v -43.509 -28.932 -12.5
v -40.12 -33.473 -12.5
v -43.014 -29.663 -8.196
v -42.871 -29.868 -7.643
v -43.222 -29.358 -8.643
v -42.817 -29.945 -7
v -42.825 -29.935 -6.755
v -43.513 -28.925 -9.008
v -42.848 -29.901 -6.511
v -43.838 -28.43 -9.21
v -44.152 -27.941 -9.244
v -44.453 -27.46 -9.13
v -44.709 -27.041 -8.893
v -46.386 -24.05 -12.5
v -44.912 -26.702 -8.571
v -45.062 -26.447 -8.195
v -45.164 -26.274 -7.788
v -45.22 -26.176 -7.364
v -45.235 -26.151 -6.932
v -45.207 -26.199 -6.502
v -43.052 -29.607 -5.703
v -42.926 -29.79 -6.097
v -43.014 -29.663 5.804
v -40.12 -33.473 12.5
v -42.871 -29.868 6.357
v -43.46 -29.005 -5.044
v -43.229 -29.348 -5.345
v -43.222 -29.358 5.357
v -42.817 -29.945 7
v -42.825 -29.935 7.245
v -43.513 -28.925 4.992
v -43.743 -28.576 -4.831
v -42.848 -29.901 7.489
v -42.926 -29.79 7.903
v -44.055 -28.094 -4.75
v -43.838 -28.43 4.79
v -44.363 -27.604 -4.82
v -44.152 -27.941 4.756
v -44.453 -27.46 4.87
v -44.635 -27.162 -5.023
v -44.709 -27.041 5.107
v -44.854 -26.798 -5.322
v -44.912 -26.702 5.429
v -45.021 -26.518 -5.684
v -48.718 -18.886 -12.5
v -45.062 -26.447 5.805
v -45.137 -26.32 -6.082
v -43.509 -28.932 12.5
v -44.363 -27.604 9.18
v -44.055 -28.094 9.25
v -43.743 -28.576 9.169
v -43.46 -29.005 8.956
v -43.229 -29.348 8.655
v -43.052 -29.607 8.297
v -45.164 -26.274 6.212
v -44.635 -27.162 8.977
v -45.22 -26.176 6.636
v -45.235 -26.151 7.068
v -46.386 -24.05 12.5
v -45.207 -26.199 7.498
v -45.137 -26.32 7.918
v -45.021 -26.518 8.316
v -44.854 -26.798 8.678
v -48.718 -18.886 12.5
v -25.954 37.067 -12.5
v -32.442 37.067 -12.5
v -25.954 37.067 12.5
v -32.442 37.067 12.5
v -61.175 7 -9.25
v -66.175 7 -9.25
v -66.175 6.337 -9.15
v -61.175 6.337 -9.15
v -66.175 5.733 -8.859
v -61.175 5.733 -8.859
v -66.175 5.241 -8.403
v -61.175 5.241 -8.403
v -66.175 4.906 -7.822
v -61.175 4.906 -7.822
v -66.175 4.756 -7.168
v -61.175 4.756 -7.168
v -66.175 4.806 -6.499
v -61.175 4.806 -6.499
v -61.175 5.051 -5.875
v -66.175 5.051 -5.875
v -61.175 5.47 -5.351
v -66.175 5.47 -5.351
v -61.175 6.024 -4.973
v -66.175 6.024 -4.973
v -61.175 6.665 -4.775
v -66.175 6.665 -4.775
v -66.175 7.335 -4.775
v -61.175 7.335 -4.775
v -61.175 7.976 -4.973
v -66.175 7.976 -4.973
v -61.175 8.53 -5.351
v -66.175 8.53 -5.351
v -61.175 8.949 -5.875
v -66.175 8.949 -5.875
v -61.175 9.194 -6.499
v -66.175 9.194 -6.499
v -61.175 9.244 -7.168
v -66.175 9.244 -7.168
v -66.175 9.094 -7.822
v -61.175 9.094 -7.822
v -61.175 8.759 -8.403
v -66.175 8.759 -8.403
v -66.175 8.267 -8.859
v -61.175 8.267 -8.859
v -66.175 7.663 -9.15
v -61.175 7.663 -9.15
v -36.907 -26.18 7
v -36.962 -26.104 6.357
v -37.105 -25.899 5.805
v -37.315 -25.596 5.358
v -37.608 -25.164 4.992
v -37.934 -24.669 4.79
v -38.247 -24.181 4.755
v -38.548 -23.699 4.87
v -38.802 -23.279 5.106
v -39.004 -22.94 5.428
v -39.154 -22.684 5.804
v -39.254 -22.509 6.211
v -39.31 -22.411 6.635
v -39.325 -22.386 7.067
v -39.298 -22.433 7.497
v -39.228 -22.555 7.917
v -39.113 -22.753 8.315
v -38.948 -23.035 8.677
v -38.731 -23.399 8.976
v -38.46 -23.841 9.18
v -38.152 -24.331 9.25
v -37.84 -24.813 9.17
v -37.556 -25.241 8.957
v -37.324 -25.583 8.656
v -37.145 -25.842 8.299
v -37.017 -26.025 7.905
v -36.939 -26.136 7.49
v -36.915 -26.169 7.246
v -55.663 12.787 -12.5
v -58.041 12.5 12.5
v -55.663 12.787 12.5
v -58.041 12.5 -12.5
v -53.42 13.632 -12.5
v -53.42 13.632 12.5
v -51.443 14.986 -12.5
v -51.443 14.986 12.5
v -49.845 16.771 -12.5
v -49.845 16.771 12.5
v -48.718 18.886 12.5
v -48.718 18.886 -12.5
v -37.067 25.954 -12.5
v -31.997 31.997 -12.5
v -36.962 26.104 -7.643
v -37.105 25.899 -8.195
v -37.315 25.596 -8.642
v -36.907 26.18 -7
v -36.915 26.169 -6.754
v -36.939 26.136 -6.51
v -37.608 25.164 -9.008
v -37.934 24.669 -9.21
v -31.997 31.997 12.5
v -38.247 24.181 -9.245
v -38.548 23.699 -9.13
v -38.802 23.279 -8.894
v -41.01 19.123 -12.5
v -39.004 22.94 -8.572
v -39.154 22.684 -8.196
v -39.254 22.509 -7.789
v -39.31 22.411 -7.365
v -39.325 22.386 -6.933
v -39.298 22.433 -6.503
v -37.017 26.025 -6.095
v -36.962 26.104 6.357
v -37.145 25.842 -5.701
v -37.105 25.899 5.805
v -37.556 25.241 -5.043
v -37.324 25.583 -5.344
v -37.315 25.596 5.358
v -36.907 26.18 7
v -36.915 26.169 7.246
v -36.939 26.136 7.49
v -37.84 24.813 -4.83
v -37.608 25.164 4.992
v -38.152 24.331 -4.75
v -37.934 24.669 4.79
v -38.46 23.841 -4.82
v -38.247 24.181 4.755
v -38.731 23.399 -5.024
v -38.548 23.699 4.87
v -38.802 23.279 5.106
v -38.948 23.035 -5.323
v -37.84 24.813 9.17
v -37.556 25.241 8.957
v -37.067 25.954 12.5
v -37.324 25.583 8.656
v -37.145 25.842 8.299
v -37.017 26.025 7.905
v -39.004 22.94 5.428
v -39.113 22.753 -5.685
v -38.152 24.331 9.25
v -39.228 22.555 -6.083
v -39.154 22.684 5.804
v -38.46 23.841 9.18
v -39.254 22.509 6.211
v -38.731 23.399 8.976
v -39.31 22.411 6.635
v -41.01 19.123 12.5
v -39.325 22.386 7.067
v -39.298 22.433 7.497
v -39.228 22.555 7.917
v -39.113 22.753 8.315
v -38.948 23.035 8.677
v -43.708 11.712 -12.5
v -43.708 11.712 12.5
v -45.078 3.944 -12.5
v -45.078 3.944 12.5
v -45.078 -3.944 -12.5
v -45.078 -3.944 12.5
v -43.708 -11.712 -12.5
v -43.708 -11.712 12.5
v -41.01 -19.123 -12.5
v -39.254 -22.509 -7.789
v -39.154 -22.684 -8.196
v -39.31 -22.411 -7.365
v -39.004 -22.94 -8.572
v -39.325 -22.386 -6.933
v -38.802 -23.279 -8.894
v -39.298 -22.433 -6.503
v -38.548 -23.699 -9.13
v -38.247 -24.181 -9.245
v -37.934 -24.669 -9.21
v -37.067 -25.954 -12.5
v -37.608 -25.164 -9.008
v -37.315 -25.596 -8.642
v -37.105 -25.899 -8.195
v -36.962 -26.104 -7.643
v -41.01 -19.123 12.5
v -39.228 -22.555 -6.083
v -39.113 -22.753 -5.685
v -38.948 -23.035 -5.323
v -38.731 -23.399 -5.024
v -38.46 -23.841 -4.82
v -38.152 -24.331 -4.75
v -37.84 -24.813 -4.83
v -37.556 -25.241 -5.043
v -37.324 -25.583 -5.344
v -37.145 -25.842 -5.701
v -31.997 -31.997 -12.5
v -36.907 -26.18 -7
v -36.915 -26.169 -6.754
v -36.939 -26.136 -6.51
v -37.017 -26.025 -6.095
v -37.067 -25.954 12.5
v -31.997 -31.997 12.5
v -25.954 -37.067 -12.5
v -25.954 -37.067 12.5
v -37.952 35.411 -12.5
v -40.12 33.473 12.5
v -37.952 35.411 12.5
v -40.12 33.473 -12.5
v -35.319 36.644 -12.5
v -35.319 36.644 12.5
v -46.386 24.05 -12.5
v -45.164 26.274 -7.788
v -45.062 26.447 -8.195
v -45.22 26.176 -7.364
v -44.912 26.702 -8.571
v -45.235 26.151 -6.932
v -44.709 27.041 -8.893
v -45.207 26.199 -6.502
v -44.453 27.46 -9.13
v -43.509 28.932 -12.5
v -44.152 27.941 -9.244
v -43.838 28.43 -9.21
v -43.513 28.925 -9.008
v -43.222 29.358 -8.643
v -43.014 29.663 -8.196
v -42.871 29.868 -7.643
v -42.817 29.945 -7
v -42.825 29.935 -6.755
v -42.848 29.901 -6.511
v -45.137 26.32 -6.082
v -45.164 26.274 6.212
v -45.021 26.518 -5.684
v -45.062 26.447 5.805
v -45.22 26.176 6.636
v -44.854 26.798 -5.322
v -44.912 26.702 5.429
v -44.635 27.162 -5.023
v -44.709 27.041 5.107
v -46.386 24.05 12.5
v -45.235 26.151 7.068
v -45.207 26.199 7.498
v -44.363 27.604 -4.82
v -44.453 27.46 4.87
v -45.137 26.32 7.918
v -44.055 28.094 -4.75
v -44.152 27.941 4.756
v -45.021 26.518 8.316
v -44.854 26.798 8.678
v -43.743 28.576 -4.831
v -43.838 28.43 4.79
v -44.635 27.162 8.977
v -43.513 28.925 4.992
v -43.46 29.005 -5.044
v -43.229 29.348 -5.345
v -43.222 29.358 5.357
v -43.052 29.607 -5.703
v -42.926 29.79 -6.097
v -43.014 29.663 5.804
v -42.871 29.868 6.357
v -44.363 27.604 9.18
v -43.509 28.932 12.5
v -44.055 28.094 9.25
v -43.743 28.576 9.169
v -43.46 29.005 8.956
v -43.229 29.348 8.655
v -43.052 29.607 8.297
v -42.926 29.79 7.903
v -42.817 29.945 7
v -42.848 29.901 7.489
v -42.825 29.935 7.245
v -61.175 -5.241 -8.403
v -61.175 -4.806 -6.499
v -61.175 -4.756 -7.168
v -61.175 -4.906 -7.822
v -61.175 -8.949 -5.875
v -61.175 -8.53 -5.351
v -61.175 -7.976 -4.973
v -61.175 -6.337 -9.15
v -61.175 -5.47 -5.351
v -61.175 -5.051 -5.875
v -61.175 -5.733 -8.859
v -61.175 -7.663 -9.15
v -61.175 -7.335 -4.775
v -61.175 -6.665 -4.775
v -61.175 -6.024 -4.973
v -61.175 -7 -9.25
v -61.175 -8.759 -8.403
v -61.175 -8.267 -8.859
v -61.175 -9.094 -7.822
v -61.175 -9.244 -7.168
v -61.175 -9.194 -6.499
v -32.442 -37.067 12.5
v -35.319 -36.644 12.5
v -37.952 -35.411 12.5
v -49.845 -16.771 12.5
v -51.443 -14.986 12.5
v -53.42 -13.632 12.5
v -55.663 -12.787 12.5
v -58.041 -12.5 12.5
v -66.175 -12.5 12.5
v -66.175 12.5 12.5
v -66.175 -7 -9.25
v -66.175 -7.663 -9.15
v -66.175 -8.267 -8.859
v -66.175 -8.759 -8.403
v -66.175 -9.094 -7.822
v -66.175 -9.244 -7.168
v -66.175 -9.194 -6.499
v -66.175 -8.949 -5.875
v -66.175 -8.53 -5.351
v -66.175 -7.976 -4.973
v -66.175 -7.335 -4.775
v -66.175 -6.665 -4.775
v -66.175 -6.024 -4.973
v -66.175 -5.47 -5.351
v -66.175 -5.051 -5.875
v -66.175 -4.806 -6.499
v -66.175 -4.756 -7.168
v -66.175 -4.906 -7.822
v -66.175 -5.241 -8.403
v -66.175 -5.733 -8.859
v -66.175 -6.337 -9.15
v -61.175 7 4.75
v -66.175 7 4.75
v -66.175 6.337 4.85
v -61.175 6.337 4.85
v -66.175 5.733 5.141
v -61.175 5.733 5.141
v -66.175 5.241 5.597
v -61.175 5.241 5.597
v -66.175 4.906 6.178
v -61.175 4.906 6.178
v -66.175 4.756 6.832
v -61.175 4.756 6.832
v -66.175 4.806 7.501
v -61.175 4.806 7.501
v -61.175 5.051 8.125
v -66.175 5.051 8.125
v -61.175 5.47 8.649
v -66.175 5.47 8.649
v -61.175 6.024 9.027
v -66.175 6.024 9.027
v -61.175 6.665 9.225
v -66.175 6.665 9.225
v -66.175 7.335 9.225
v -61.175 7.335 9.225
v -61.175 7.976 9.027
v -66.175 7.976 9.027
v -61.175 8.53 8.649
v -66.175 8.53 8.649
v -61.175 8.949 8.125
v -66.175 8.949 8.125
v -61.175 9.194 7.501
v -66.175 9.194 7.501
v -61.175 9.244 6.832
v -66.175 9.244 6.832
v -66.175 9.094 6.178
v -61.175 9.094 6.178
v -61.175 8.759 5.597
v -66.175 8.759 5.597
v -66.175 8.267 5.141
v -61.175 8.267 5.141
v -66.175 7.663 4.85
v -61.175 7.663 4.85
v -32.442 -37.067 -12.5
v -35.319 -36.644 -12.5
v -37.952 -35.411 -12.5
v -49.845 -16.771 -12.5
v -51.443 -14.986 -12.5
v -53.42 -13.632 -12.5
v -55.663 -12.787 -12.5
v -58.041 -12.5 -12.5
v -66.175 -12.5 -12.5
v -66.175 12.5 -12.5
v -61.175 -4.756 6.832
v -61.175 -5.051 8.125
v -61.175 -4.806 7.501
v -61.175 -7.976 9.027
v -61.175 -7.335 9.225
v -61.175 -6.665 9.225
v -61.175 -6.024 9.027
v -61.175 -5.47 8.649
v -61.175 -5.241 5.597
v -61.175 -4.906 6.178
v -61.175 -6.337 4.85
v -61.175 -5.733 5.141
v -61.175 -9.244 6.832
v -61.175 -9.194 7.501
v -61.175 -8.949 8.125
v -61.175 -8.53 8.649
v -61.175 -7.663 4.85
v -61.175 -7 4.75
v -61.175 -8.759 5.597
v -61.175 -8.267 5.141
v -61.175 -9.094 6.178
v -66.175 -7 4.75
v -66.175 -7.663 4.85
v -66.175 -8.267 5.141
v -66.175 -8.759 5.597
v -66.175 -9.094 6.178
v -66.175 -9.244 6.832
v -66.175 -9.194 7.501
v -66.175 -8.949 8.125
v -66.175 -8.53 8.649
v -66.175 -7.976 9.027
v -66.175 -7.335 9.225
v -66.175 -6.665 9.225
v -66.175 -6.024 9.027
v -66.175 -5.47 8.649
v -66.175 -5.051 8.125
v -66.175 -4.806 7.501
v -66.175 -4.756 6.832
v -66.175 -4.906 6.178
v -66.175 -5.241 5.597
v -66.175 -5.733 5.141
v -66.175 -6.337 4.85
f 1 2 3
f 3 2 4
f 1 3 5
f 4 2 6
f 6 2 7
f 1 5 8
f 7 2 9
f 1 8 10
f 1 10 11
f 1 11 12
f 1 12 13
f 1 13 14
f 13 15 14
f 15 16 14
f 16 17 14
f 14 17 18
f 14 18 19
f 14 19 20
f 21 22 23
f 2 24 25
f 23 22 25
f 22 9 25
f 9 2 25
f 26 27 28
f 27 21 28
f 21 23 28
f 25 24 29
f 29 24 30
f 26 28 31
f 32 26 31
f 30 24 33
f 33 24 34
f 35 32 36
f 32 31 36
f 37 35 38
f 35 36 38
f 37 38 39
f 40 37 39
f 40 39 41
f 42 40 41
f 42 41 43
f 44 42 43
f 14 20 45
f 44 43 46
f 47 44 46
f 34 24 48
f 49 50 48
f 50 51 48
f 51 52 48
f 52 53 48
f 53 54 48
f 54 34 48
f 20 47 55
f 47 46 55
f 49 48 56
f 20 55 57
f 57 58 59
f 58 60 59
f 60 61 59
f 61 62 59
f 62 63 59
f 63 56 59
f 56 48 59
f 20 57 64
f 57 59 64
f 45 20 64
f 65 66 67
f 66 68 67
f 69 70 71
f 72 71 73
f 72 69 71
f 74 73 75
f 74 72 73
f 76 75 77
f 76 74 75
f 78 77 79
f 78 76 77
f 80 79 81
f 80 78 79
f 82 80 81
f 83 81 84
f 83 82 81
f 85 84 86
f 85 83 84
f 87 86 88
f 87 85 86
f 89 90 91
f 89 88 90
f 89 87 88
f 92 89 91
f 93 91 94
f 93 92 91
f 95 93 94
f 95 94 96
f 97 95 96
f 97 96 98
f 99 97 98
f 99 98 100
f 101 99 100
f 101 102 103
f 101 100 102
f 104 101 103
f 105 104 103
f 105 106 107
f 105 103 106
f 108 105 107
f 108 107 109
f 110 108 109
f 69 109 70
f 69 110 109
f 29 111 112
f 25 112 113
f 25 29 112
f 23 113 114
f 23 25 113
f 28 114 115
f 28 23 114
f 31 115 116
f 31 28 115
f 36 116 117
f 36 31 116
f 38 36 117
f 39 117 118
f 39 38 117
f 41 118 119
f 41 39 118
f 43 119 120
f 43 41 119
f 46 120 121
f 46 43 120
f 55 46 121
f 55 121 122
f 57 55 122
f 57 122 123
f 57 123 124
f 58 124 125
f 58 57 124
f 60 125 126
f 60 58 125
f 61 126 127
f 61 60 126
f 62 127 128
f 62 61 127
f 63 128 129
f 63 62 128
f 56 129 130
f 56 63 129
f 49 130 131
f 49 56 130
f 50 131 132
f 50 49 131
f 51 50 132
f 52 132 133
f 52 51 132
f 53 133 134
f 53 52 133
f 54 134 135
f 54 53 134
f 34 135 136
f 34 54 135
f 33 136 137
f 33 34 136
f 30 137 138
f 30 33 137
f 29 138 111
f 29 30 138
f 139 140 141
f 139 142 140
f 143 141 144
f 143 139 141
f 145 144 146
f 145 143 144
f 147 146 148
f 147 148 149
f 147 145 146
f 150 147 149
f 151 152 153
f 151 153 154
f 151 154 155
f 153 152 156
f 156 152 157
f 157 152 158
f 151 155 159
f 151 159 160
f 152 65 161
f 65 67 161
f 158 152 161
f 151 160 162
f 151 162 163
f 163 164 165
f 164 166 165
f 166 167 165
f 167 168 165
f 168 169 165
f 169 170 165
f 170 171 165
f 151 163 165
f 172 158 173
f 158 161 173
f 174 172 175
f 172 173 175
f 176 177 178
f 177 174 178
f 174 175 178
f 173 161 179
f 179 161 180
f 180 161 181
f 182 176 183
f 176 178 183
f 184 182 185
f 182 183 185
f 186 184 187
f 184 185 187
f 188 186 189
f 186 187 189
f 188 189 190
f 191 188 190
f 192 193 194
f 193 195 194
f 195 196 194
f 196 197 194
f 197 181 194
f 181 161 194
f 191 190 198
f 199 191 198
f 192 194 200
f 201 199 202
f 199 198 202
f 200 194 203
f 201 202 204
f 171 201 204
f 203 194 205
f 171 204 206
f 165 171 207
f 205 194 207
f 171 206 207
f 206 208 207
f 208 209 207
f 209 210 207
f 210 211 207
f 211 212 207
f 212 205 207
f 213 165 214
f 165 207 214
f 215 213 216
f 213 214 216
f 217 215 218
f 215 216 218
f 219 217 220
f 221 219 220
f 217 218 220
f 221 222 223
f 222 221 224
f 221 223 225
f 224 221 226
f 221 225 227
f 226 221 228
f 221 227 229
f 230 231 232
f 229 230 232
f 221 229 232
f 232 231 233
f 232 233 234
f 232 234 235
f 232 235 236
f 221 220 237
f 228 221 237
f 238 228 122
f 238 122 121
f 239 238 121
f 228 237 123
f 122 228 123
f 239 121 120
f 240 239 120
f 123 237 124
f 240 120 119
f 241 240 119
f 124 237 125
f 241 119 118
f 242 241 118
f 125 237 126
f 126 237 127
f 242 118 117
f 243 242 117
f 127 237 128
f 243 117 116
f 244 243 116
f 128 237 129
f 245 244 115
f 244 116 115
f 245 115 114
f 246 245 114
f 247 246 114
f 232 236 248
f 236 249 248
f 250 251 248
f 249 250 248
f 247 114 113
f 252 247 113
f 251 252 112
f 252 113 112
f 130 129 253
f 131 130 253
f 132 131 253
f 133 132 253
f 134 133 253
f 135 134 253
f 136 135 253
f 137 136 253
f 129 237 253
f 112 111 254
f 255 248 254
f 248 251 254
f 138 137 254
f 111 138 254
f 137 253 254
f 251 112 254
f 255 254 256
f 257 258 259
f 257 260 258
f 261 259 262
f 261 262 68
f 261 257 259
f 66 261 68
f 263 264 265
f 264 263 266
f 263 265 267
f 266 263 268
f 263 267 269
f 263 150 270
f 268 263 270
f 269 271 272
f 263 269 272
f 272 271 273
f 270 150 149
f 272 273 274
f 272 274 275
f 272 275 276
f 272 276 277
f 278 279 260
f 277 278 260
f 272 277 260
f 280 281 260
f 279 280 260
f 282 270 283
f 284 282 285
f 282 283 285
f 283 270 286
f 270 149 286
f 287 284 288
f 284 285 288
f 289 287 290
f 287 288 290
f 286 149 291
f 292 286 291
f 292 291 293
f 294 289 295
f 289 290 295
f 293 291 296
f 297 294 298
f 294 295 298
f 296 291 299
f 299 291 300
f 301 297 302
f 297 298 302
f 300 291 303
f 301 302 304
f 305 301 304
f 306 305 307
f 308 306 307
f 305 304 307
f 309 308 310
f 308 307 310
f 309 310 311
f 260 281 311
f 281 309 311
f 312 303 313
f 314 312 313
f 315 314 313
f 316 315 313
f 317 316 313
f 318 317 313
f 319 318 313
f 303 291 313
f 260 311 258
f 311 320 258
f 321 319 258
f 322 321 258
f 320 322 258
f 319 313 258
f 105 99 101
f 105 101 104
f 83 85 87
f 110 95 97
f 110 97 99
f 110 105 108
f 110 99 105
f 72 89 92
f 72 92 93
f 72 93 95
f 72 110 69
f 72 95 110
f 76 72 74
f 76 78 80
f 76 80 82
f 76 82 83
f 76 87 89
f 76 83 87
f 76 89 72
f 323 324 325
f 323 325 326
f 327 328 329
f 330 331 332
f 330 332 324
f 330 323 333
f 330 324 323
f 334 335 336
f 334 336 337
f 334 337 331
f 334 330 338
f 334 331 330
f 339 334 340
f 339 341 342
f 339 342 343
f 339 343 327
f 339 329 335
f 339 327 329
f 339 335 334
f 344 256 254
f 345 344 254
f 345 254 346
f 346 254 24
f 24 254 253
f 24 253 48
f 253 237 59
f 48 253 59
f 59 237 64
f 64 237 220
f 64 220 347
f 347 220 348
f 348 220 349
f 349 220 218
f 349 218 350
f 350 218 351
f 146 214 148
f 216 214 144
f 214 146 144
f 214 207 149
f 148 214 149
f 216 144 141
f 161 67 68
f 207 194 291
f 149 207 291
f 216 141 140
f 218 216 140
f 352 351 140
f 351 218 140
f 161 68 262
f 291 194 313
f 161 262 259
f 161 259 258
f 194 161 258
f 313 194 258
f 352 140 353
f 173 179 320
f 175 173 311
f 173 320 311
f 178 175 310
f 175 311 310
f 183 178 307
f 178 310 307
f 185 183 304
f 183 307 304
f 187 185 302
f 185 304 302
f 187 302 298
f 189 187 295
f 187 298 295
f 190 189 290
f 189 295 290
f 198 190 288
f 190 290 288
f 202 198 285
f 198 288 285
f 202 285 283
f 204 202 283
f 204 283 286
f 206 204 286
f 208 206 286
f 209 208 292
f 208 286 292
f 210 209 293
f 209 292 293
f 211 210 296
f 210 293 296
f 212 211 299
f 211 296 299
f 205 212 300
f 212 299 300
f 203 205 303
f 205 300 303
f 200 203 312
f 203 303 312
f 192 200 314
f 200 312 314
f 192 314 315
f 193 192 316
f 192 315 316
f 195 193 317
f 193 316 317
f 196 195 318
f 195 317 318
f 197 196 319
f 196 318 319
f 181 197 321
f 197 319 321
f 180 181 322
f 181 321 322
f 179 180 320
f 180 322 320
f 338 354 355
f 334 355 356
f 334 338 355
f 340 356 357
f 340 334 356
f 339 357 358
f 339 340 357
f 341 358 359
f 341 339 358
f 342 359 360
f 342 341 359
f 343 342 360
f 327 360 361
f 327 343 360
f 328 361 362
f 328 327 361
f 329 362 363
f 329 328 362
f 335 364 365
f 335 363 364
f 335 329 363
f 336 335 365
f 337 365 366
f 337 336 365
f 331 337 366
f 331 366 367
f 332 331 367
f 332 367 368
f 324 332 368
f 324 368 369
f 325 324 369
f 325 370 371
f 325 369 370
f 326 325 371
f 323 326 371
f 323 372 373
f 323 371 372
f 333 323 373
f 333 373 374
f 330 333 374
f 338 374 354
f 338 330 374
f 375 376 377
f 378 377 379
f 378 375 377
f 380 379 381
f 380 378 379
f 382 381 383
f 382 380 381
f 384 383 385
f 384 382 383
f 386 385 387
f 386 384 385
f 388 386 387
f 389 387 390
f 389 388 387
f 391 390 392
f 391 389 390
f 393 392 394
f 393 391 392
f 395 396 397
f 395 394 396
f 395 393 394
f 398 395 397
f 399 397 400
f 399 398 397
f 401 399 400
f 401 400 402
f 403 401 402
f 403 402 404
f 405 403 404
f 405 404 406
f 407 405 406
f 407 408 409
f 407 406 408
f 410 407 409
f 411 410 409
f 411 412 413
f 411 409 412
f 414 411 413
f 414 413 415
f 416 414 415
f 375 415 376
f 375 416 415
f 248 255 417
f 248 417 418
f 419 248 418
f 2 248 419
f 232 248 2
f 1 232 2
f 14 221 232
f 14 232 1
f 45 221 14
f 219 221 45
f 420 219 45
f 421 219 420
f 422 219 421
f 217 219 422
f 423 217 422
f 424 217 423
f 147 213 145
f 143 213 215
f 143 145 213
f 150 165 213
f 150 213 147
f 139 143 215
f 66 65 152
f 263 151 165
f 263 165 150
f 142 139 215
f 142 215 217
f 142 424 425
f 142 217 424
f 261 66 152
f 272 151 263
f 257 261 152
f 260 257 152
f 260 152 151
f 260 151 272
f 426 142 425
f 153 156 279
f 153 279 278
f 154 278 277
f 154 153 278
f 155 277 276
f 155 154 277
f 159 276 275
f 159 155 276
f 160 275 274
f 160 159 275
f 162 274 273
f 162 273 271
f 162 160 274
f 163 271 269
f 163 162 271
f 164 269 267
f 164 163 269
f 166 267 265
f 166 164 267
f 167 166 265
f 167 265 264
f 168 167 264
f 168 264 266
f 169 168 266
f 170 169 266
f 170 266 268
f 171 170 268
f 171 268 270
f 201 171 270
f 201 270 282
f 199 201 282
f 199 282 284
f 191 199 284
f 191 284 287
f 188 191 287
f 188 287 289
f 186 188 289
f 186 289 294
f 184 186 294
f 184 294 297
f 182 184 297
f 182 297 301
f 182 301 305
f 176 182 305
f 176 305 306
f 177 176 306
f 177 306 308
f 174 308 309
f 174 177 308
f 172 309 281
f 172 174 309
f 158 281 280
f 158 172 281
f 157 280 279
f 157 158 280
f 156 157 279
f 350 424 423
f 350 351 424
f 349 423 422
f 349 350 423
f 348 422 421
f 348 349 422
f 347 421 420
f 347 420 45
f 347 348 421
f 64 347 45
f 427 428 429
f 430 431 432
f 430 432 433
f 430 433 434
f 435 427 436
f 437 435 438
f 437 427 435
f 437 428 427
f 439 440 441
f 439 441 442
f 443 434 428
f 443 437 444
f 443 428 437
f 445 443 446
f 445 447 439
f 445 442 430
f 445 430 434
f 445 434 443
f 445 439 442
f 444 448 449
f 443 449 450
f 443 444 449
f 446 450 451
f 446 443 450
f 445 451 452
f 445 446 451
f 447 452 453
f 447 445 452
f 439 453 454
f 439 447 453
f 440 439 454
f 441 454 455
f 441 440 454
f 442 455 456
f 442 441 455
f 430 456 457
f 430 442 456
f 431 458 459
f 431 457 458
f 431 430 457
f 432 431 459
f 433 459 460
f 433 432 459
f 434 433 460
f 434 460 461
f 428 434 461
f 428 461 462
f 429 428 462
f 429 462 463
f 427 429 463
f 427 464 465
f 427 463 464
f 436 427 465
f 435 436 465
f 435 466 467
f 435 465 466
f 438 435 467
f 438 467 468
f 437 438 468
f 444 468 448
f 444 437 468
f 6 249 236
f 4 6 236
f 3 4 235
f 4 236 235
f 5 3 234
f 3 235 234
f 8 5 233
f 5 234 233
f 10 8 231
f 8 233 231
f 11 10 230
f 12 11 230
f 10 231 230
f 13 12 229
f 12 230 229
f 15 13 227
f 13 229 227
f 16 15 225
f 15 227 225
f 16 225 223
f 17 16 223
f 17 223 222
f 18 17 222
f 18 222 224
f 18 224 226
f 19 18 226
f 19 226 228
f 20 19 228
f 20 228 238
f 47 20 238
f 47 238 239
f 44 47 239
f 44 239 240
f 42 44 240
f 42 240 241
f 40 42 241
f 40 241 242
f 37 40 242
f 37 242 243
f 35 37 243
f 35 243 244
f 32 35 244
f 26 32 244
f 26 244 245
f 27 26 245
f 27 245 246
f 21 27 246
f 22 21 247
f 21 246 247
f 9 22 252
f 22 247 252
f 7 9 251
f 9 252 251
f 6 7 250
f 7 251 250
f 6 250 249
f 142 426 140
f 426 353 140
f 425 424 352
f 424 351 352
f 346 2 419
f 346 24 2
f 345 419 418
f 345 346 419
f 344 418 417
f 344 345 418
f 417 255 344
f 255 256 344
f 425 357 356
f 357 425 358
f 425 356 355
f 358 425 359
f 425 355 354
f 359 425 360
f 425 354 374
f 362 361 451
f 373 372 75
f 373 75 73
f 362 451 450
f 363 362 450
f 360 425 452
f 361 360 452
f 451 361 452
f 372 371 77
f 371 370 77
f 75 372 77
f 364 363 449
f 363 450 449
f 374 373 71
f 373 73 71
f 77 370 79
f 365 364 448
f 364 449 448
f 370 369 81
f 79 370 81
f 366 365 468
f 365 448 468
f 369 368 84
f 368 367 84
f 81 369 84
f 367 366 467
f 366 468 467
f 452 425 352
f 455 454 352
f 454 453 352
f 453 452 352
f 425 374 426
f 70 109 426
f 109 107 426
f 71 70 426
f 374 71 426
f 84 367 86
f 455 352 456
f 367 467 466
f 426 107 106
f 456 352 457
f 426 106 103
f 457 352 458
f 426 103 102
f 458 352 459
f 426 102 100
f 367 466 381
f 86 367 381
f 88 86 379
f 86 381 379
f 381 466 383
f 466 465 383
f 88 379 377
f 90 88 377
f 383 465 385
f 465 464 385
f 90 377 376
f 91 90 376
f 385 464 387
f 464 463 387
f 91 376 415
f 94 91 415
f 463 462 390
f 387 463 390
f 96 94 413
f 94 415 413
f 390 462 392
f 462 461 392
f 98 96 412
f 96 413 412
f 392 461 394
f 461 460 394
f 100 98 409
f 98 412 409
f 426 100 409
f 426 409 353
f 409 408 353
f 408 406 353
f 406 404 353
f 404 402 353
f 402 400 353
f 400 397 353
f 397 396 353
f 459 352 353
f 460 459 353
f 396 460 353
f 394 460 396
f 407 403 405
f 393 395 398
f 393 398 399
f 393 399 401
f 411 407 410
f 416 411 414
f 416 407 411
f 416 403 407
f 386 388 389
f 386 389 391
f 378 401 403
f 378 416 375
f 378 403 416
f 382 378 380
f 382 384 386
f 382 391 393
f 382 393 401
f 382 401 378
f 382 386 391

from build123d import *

# Parameters (mm, degrees)
BOSS_EXTRUDE1_DEPTH     = 12.5
SKETCH3_R               = 2.25
CUT_EXTRUDE1_DEPTH      = 77.872073504
CUT_EXTRUDE2_DEPTH      = 57.106034184
CUT_EXTRUDE2_DEPTH_BACK = 5
SKETCH5_R               = 2.25
FILLET4_R               = 10


with BuildPart() as part:
    # Sketch1 → Boss-Extrude1 (new, symmetric)
    with BuildSketch(Plane.XY):
        with BuildLine():
            Line((-66.175, -12.5), (-66.175, 12.5))
            Line((-66.175, 12.5), (-50.732755691, 12.5))
            ThreePointArc((-50.732755691, 12.5), (-45.469745991, 25.740332157), (-36.825635638, 37.066630004))
            Line((-36.825635638, 37.066630004), (-25.954333745, 37.066630004))
            ThreePointArc((-25.954333745, 37.066630004), (-45.25, 0), (-25.954333745, -37.066630004))
            Line((-25.954333745, -37.066630004), (-36.825635638, -37.066630004))
            ThreePointArc((-36.825635638, -37.066630004), (-45.469745991, -25.740332157), (-50.732755691, -12.5))
            Line((-50.732755691, -12.5), (-66.175, -12.5))
        make_face()
    extrude(amount=BOSS_EXTRUDE1_DEPTH, both=True)

    # Sketch3 → Cut-Extrude1 (cut, symmetric)
    with BuildSketch(Plane(origin=(0, 0, 0), x_dir=(0, 0, 1), z_dir=(-0.8433914458128852, 0.5372996083468248, 0))):
        with Locations(Location((-7, 0, 0), (0, 0, 90))):
            Circle(SKETCH3_R)
        with Locations(Location((7, 0, 0), (0, 0, 90))):
            Circle(SKETCH3_R)
    cut_extrude1 = extrude(amount=CUT_EXTRUDE1_DEPTH, both=True, mode=Mode.SUBTRACT)

    # Mirror1: Cut-Extrude1 across plane
    add(cut_extrude1.mirror(Plane.ZX), mode=Mode.SUBTRACT)

    # Sketch5 → Cut-Extrude2 (cut, two sides: drawn at the far end of the back side and taken through both)
    with BuildSketch(Plane.ZY.offset(66.175).offset(-CUT_EXTRUDE2_DEPTH_BACK)):
        with Locations(Location((-7, 7, 0), (0, 0, 180))):
            Circle(SKETCH5_R)
        with Locations(Location((7, 7, 0), (0, 0, 180))):
            Circle(SKETCH5_R)
        with Locations(Location((7, -7, 0), (0, 0, 180))):
            Circle(SKETCH5_R)
        with Locations(Location((-7, -7, 0), (0, 0, 180))):
            Circle(SKETCH5_R)
    extrude(amount=CUT_EXTRUDE2_DEPTH + CUT_EXTRUDE2_DEPTH_BACK, mode=Mode.SUBTRACT)

    # Fillet4
    fillet4_edges = [part.edges().sort_by_distance(p)[0] for p in [
        (-36.825635638, -37.066630004, 0),
        (-50.732755691, -12.5, 0),
        (-50.732755691, 12.5, 0),
        (-36.825635638, 37.066630004, 0),
    ]]
    fillet(fillet4_edges, radius=FILLET4_R)


solid = part.part
